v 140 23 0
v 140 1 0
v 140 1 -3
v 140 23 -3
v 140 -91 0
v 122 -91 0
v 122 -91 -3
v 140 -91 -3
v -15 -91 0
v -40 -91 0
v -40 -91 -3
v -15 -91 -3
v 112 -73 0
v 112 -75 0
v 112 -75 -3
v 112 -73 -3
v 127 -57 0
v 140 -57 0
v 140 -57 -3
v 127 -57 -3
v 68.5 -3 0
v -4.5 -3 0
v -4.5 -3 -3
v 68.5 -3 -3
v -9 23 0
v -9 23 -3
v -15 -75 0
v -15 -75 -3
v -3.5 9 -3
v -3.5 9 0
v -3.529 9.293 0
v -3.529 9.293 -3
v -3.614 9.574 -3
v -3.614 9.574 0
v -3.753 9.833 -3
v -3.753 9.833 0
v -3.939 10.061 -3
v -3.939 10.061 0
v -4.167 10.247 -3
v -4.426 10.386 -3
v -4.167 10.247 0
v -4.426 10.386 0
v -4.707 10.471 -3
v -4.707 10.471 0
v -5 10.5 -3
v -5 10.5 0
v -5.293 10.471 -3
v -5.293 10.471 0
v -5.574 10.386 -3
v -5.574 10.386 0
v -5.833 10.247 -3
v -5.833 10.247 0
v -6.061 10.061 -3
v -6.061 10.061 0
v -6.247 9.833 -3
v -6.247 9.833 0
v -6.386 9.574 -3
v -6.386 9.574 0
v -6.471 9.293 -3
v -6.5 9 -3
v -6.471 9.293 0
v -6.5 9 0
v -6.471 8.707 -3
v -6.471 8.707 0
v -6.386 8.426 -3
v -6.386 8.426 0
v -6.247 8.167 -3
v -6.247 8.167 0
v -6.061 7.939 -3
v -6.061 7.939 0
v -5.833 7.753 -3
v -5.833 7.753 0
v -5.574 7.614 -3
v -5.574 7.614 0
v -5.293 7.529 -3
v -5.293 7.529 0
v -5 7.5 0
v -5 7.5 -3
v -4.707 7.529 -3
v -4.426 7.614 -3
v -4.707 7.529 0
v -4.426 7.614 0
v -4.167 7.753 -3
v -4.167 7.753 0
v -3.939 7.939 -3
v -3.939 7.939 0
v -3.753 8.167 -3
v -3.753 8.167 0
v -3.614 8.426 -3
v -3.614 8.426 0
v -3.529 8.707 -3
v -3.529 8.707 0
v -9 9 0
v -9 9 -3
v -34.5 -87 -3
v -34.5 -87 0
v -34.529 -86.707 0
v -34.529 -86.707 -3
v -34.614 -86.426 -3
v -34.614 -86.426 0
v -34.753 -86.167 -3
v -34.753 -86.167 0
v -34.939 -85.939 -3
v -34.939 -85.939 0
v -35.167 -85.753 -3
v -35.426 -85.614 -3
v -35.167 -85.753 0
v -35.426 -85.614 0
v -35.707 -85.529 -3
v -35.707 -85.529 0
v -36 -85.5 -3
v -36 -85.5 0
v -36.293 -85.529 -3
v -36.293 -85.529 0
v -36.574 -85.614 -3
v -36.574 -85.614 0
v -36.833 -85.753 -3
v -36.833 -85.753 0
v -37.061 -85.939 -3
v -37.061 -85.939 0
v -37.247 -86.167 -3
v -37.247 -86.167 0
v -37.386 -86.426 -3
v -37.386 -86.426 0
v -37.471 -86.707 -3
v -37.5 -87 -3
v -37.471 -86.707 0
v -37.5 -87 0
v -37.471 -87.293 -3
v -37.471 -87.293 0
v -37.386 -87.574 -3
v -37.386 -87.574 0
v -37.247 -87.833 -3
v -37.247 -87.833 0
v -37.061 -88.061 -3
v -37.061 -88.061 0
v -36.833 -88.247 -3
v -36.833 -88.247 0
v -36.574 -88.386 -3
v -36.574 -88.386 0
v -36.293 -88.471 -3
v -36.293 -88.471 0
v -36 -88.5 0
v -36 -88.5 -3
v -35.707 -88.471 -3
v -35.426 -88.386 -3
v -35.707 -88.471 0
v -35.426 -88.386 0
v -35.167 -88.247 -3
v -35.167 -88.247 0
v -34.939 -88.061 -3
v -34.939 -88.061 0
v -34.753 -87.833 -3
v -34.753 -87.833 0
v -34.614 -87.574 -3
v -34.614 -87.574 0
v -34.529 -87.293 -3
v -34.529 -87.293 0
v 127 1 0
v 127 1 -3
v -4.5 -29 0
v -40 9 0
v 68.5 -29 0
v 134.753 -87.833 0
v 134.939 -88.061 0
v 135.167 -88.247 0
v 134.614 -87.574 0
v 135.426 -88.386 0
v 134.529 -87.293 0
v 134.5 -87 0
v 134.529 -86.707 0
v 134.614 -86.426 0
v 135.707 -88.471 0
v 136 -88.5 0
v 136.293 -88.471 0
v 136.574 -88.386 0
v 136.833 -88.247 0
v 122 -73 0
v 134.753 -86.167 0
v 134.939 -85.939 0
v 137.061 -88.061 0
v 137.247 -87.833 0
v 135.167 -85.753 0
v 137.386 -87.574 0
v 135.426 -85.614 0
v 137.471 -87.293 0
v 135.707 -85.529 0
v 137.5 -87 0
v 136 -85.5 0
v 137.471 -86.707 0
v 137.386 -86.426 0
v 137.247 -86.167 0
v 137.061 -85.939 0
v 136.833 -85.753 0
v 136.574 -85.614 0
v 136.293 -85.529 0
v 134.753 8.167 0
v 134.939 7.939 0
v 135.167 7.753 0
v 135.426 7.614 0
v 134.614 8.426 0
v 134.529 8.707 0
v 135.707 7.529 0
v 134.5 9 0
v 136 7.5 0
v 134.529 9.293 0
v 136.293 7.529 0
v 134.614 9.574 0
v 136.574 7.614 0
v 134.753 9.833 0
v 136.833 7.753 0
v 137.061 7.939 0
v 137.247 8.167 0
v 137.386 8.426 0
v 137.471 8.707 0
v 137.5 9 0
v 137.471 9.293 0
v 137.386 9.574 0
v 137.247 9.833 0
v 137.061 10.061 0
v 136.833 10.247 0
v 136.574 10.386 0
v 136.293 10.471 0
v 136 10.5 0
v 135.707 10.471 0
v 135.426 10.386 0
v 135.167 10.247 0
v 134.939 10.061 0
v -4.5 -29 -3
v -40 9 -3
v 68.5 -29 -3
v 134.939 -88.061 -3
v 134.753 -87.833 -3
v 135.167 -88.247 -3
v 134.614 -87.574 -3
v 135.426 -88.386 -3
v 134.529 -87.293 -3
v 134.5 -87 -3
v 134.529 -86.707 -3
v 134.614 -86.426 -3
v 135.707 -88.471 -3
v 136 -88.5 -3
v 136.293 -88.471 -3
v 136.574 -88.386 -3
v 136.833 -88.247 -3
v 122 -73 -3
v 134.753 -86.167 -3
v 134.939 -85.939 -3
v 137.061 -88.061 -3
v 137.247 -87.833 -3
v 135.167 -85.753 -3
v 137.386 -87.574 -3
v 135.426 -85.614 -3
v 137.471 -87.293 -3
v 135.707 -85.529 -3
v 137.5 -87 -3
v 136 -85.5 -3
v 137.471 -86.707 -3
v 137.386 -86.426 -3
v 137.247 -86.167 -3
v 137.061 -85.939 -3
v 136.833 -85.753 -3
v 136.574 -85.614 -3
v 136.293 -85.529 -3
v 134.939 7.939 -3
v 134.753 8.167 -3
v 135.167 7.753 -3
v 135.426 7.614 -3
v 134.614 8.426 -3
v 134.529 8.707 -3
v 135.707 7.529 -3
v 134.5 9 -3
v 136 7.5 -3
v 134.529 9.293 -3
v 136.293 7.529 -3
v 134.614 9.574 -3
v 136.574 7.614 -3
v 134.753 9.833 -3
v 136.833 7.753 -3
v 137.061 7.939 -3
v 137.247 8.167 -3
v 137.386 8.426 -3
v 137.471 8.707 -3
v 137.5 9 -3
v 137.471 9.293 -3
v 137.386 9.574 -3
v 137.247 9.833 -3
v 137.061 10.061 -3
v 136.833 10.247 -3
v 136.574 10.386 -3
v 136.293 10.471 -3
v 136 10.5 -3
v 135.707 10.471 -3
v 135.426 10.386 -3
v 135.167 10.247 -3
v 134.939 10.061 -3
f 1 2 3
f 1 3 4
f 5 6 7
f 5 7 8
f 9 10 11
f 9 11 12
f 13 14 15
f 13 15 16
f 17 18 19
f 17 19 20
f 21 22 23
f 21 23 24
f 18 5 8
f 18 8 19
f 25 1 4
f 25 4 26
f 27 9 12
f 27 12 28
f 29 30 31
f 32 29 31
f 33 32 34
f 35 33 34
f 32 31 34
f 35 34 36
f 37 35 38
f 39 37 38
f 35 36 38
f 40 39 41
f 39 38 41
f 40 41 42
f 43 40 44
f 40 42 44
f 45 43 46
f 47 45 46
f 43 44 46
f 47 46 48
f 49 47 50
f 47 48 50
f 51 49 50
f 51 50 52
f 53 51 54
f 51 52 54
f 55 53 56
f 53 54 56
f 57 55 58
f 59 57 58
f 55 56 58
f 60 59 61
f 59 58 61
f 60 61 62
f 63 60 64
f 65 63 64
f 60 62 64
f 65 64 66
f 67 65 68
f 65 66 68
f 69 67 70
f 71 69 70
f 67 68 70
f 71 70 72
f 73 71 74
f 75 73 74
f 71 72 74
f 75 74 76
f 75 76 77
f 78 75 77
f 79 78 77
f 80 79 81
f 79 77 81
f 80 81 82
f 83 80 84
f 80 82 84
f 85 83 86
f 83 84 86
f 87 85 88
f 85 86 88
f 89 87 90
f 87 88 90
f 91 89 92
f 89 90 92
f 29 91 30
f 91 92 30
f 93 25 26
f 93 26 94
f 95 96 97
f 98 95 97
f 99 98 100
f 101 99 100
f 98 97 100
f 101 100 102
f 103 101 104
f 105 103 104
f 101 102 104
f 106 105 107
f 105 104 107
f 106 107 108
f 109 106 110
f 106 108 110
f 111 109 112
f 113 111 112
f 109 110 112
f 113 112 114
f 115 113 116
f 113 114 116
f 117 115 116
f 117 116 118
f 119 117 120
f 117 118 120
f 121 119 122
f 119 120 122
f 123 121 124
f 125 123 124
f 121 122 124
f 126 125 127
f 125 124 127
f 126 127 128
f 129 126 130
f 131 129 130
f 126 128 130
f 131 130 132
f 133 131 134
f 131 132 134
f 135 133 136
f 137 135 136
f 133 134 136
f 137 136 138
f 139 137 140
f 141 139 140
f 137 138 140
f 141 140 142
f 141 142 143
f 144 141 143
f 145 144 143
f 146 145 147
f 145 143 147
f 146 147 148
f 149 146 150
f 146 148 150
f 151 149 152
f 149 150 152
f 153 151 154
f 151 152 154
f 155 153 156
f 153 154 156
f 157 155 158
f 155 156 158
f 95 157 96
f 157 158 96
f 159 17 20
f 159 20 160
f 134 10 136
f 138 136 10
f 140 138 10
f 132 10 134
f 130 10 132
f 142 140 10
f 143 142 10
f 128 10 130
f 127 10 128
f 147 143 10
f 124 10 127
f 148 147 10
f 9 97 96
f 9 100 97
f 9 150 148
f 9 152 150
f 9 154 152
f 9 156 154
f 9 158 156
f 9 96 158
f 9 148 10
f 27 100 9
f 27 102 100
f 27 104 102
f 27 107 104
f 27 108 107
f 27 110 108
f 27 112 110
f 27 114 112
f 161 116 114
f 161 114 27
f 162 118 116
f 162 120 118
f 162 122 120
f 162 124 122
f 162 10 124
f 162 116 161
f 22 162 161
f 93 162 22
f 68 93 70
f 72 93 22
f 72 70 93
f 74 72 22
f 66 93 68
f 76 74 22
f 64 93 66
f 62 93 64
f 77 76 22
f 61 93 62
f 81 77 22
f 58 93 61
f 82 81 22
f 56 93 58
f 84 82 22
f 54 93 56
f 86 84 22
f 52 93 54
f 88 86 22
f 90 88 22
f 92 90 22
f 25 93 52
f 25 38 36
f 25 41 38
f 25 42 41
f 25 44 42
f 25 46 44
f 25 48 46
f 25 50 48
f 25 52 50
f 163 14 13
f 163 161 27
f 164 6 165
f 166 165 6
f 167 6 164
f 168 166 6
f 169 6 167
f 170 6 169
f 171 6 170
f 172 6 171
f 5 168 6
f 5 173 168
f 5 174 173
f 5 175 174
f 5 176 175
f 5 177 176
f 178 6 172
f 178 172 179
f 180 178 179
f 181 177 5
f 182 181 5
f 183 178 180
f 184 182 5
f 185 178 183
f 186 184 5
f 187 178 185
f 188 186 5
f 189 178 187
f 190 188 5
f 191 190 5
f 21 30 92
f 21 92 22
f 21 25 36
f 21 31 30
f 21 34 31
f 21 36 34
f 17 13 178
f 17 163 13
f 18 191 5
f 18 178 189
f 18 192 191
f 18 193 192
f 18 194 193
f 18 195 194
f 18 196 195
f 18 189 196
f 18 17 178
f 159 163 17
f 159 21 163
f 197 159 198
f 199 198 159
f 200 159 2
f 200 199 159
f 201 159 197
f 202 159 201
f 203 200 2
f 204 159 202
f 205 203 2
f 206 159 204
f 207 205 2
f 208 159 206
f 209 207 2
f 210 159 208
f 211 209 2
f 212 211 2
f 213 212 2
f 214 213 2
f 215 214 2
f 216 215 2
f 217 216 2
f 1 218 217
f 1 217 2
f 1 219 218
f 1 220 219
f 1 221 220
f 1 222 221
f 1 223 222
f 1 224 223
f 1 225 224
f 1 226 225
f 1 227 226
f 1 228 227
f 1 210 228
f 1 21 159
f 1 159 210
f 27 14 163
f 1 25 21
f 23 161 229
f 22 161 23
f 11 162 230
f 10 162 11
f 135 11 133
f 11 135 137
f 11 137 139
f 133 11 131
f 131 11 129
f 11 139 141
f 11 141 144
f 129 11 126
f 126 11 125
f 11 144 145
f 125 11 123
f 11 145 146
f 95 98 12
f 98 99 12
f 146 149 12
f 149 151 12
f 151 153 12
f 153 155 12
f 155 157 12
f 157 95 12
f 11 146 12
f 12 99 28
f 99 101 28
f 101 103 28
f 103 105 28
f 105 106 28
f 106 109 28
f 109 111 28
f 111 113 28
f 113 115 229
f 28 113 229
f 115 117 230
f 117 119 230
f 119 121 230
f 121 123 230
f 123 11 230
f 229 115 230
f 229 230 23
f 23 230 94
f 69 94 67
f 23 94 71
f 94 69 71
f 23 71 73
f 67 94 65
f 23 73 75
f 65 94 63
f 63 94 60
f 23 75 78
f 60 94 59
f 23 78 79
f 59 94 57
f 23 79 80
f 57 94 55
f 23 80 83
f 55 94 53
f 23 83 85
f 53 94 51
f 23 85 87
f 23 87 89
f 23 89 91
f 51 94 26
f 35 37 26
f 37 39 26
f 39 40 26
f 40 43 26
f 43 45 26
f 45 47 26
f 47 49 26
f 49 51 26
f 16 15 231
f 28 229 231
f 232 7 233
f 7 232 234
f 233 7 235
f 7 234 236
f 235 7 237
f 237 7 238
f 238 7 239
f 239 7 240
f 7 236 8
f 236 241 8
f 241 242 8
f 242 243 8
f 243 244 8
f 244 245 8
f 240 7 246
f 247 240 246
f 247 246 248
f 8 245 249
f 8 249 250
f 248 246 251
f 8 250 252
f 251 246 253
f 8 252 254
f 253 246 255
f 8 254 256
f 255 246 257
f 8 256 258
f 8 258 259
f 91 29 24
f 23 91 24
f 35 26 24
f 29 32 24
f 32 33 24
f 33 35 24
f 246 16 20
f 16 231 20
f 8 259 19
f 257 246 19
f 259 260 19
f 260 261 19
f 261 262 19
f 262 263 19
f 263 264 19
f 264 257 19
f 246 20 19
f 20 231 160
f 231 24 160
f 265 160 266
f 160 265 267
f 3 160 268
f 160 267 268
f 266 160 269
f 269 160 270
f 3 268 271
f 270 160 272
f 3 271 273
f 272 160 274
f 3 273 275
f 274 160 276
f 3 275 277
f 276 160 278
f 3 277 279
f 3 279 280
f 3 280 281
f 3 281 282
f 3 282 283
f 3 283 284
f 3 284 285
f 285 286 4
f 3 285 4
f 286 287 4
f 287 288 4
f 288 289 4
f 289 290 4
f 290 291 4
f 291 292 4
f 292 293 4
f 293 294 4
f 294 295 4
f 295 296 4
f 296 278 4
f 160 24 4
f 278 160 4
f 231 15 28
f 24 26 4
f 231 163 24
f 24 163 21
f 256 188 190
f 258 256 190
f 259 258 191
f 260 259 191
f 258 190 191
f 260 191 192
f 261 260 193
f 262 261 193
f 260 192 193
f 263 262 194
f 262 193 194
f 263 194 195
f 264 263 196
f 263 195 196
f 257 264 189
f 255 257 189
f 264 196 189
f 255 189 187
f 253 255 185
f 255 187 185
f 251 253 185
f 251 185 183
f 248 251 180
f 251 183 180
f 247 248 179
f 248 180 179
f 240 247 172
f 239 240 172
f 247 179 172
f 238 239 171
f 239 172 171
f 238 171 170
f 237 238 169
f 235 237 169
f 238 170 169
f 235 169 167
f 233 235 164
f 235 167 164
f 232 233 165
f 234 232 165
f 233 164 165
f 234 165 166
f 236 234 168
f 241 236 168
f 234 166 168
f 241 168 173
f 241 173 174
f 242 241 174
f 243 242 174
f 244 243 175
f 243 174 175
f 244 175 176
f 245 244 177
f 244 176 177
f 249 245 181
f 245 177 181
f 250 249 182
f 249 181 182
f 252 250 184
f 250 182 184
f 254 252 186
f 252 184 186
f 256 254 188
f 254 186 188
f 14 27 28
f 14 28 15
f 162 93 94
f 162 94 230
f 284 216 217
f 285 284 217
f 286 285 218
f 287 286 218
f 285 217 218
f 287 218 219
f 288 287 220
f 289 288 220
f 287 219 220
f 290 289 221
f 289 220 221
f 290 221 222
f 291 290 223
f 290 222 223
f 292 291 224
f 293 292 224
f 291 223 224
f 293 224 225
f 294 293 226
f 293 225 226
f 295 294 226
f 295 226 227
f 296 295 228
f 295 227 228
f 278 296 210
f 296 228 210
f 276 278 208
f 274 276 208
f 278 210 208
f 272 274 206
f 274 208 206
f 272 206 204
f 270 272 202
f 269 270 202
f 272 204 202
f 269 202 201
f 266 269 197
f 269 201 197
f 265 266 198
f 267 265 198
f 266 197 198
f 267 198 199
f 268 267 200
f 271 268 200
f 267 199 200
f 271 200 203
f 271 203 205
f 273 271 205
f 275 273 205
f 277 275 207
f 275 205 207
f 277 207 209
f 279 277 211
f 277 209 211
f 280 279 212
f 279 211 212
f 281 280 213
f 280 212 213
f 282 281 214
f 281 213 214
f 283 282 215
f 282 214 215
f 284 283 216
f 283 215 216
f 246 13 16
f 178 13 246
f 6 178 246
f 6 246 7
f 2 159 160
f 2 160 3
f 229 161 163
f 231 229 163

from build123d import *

# Parameters (mm, degrees)
SKETCH1_R           = 1.5
SKETCH1_W           = 73
SKETCH1_H           = 26
BOSS_EXTRUDE1_DEPTH = 3


with BuildPart() as part:
    # Sketch1 → Boss-Extrude1 (new body)
    with BuildSketch(Plane.XY):
        Polygon((-40, -91), (-15, -91), (-15, -75), (112, -75), (112, -73), (122, -73), (122, -91), (140, -91), (140, -57), (127, -57), (127, 1), (140, 1), (140, 23), (-9, 23), (-9, 9), (-40, 9), align=None)
        with Locations((-5, 9)):
            Circle(SKETCH1_R, mode=Mode.SUBTRACT)
        with Locations((136, 9)):
            Circle(SKETCH1_R, mode=Mode.SUBTRACT)
        with Locations((136, -87)):
            Circle(SKETCH1_R, mode=Mode.SUBTRACT)
        with Locations((-36, -87)):
            Circle(SKETCH1_R, mode=Mode.SUBTRACT)
        with Locations((32, -16)):
            Rectangle(SKETCH1_W, SKETCH1_H, mode=Mode.SUBTRACT)
    extrude(amount=-BOSS_EXTRUDE1_DEPTH)


solid = part.part
